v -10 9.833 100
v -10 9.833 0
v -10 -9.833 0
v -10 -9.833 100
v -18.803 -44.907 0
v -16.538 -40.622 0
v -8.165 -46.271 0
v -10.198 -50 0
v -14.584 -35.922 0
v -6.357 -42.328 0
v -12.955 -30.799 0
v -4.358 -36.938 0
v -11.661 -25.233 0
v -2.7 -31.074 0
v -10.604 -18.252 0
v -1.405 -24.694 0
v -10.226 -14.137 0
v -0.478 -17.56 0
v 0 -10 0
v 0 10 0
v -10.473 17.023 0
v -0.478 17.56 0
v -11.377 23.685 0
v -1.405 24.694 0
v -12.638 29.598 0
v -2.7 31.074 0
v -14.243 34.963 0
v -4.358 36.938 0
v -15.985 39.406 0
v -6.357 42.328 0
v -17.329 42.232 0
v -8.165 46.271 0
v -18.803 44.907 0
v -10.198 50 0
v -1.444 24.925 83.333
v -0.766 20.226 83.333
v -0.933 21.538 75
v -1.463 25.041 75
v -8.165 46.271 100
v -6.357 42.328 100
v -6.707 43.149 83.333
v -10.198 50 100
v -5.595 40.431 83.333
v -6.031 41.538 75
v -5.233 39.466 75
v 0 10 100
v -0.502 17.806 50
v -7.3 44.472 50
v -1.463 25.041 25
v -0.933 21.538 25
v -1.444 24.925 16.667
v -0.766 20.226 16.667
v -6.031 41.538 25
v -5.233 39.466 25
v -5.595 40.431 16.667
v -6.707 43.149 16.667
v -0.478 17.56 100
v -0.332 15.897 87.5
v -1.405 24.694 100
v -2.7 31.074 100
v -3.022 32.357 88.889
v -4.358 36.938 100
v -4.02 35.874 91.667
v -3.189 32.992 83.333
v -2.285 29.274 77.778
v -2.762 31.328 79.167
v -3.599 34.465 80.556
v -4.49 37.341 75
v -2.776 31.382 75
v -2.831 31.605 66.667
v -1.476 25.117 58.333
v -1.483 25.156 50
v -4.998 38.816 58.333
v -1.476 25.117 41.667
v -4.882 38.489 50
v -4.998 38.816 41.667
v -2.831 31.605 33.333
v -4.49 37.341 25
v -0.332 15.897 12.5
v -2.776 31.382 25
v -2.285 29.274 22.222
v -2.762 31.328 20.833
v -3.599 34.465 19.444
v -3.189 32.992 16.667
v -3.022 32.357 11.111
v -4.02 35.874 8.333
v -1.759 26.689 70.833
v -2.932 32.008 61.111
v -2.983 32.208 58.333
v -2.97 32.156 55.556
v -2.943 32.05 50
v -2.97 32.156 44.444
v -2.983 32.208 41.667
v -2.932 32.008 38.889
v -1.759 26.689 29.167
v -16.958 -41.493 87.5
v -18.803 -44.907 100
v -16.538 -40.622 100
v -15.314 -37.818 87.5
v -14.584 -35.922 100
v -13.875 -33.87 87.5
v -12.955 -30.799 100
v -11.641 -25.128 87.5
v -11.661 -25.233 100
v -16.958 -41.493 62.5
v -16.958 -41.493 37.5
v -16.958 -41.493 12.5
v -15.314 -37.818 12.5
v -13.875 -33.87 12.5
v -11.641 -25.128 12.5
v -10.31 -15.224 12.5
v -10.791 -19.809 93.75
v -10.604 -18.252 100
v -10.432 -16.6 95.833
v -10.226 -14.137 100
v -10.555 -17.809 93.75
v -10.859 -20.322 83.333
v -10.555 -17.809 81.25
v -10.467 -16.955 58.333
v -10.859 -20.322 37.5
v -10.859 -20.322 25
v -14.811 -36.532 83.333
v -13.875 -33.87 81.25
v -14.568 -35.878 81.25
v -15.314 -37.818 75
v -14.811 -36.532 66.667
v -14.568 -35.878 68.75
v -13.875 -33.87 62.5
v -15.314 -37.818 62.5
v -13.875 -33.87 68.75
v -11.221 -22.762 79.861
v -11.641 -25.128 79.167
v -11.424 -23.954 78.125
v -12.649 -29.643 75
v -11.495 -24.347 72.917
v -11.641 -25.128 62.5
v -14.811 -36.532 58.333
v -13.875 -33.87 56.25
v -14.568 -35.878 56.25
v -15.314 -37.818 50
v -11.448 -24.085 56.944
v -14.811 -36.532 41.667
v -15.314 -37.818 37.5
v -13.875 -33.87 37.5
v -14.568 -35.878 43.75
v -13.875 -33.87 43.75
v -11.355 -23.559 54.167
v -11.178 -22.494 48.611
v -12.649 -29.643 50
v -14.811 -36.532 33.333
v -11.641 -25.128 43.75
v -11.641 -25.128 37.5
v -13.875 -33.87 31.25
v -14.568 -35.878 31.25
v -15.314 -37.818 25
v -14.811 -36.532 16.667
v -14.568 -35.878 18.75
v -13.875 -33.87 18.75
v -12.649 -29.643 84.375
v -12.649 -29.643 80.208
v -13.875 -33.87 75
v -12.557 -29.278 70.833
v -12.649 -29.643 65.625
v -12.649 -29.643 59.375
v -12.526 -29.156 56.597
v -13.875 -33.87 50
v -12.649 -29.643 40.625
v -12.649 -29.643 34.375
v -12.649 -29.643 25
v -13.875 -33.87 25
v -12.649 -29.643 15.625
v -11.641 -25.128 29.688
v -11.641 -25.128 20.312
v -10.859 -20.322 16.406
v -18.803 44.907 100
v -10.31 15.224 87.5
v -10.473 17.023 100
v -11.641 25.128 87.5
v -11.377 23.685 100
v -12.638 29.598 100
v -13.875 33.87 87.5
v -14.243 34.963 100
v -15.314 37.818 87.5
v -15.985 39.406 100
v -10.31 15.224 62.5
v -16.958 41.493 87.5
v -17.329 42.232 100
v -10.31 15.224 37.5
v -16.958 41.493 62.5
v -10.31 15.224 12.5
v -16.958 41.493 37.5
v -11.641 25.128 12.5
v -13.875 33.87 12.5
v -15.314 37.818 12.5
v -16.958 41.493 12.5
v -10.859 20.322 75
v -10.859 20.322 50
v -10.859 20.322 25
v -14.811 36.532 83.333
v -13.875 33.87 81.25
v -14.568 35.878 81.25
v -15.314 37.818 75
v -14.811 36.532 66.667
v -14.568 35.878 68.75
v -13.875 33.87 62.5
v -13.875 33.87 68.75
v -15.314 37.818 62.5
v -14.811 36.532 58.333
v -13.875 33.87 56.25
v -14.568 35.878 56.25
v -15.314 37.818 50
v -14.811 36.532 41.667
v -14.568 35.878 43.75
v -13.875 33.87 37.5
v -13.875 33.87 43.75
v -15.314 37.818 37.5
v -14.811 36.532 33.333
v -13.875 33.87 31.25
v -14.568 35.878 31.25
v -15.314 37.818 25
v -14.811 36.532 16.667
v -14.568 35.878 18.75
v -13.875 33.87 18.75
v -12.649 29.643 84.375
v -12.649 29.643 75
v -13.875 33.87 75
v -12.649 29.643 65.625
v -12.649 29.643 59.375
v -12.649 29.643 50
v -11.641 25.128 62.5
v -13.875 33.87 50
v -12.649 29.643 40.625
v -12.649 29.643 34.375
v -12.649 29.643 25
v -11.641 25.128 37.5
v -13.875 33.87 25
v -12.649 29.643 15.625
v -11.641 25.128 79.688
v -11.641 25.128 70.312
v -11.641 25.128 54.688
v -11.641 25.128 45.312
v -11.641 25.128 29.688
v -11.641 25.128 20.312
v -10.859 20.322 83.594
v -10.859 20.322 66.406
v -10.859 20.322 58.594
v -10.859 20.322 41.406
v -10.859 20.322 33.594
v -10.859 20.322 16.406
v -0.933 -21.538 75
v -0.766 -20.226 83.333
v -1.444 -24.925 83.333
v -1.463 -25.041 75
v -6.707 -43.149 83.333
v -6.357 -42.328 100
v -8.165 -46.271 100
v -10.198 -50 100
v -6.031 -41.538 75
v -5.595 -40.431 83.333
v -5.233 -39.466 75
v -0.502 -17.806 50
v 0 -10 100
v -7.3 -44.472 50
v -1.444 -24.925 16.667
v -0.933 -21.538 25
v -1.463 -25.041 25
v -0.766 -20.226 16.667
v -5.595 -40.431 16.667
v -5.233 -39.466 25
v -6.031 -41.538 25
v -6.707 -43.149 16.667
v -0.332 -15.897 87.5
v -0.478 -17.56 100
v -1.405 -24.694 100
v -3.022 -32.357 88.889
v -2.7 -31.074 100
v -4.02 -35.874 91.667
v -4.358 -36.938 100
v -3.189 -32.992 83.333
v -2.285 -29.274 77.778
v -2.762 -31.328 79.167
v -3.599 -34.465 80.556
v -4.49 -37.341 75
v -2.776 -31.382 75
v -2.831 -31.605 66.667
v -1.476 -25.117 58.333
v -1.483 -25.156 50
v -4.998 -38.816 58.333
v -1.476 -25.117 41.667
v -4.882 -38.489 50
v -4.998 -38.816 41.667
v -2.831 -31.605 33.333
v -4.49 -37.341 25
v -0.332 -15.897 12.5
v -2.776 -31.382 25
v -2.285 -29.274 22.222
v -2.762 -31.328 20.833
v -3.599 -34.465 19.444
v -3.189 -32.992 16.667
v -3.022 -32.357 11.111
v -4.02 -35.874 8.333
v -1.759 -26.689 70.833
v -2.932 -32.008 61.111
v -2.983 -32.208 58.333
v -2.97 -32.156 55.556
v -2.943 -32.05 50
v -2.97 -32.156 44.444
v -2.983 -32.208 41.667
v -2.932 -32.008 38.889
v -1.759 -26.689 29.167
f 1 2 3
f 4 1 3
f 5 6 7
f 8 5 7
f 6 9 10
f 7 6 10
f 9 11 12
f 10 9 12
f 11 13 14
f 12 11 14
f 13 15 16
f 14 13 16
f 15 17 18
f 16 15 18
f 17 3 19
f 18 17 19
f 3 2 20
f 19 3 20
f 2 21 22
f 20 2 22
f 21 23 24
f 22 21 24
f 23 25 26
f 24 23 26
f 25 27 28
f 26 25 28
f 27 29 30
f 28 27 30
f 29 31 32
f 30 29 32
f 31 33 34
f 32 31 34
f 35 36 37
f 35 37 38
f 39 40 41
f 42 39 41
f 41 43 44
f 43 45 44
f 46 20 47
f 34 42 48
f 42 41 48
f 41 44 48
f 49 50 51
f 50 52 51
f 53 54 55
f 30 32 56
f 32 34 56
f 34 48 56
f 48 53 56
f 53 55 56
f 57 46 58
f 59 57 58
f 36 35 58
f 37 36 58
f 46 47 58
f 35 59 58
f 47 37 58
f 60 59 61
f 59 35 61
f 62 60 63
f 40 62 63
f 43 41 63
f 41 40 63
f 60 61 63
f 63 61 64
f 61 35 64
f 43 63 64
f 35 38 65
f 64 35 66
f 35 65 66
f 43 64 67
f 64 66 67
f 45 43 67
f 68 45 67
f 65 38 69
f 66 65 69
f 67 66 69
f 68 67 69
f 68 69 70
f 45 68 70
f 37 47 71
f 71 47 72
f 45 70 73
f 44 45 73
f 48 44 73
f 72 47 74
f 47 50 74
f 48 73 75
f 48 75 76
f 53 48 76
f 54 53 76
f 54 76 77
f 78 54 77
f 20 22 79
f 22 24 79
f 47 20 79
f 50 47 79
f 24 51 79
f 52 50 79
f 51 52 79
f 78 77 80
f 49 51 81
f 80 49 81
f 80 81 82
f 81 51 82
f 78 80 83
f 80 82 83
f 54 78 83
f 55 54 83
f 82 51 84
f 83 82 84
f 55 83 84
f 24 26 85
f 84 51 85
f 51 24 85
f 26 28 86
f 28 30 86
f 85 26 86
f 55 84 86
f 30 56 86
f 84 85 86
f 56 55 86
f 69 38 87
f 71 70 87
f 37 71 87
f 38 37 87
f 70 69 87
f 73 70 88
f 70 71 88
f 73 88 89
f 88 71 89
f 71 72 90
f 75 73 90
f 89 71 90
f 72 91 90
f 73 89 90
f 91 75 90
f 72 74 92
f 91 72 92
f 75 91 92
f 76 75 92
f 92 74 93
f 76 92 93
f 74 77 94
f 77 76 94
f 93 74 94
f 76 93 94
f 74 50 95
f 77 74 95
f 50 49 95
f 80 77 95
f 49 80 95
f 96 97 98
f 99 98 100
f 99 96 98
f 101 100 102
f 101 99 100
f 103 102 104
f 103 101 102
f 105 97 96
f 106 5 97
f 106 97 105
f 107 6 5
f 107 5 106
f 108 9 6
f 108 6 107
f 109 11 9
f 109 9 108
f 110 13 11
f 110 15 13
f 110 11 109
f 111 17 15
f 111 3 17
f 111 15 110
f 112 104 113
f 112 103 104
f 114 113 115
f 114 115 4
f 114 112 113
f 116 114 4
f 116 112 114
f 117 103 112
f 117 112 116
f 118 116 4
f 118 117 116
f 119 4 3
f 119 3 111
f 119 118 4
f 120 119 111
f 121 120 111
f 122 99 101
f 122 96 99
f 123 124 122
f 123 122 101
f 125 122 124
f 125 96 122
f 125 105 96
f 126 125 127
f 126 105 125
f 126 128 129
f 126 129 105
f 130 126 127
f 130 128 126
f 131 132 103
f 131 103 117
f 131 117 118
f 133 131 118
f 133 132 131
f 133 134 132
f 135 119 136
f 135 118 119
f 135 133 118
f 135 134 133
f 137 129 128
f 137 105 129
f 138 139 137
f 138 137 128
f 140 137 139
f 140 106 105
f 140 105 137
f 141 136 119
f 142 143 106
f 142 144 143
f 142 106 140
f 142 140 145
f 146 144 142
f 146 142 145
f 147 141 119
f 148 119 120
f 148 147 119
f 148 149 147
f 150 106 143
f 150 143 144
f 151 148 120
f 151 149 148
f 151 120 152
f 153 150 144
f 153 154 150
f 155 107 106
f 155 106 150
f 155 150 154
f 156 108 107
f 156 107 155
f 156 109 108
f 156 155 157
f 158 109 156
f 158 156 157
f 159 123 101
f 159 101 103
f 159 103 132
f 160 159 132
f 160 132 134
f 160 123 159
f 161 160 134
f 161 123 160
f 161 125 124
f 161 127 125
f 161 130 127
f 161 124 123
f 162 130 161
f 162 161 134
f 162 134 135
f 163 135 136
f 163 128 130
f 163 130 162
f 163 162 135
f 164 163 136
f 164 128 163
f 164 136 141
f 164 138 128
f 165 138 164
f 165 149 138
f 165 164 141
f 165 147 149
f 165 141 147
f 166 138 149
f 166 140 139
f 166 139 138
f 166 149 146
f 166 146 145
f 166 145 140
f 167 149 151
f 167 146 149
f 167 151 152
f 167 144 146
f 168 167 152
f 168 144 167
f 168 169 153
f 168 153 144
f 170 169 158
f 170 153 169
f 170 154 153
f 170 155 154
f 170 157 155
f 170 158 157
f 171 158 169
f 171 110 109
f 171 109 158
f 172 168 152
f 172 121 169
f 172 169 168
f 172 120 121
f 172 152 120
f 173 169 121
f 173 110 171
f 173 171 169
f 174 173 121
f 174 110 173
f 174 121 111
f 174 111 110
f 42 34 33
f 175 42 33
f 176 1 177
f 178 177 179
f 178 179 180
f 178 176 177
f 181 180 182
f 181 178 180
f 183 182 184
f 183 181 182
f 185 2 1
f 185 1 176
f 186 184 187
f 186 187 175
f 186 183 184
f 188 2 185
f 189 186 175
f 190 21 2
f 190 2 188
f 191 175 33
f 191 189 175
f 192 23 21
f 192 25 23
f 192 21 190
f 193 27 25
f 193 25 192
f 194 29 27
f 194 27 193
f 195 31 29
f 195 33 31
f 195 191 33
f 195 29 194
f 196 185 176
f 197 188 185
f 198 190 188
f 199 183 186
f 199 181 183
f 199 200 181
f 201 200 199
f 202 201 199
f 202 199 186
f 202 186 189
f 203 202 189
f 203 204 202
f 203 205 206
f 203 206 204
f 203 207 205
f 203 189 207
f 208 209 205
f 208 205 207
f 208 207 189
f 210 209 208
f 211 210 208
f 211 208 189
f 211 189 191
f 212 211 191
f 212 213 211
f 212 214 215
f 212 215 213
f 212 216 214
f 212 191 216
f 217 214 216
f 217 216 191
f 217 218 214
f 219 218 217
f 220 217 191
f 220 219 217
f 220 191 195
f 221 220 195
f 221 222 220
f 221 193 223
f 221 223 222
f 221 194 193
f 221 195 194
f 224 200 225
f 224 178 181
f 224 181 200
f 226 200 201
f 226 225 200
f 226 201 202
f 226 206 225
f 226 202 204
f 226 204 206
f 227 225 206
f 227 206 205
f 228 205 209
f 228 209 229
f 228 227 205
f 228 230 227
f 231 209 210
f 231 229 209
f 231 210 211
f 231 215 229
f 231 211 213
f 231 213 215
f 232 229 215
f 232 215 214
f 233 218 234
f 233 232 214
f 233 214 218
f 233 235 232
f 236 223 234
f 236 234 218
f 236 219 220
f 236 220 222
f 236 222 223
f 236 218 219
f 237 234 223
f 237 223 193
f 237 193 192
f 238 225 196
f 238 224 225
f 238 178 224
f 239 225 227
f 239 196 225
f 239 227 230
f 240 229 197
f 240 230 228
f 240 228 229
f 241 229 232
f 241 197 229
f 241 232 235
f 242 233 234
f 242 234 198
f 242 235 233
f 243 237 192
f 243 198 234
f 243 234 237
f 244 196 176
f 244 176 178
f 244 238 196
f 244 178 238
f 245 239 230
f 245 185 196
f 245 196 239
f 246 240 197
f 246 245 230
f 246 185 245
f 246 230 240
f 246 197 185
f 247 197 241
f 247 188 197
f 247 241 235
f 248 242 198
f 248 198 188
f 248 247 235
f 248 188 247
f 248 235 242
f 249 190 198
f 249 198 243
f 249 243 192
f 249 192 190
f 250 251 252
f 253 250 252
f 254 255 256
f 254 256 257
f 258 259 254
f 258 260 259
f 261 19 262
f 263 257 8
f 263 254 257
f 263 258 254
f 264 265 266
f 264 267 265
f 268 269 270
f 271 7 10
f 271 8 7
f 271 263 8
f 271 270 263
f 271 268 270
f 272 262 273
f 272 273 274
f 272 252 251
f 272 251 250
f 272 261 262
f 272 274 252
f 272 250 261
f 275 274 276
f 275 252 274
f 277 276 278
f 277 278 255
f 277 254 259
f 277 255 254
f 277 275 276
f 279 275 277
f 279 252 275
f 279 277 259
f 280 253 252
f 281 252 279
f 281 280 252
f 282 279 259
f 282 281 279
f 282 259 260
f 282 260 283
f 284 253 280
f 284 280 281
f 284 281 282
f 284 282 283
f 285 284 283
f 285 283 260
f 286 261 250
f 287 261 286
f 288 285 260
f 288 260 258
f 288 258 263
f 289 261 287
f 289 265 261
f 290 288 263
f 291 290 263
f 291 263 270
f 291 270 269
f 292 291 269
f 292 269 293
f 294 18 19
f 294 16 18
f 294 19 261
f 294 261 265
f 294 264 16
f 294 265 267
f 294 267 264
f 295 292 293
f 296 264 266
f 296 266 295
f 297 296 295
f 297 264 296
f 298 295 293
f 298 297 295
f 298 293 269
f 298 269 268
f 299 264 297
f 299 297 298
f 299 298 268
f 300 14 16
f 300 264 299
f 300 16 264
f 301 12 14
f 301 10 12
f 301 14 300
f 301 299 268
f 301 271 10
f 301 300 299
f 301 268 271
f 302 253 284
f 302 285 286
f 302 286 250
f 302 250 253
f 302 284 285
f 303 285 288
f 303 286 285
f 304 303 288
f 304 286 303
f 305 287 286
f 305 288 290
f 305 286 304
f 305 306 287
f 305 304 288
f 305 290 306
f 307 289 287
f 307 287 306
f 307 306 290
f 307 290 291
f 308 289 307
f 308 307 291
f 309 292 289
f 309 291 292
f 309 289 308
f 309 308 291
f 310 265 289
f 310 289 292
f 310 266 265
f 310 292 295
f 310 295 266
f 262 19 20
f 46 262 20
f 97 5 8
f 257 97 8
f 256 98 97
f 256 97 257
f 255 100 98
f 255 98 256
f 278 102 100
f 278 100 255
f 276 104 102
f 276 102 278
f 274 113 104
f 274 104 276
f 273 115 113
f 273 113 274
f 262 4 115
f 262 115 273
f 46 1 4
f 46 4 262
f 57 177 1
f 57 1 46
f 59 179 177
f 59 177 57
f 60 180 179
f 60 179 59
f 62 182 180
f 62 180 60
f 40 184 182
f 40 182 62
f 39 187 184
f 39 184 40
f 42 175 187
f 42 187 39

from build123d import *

# Parameters (mm, degrees)
BOSS_EXTRUDE1_DEPTH = 100


with BuildPart() as part:
    # Sketch1 → Boss-Extrude1 (new body)
    with BuildSketch(Plane.XY):
        with BuildLine():
            Line((0, 0), (0, 10))
            add(Edge.make_bspline(
                [(0, 10), (-0.787242099, 34.100733869), (-10.197534483, 50)],
                knots=[0, 0, 0, 1, 1, 1], degree=2))
            Line((-10.197534483, 50), (-18.803177319, 44.906581563))
            add(Edge.make_bspline(
                [(-10, 9.833471065), (-10.030967353, 10.744471696), (-10.114706096, 12.582680835), (-10.361531, 16.119334261), (-10.820269758, 20.371956037), (-11.603430489, 25.176045178), (-12.949670493, 31.196907646), (-14.728828853, 36.634857764), (-16.928703227, 41.544185237), (-18.144309171, 43.793383416), (-18.803177319, 44.906581563)],
                knots=[0.003595485, 0.003595485, 0.003595485, 0.003595485, 0.065870767, 0.12814605, 0.252696614, 0.377247178, 0.501797743, 0.750898871, 0.875449436, 1, 1, 1, 1], degree=3))
            Line((-10, 9.833471065), (-10, 0))
            Line((-10, 0), (-10, -9.833471065))
            add(Edge.make_bspline(
                [(-18.803177319, -44.906581563), (-18.144309171, -43.793383416), (-16.928703227, -41.544185237), (-14.728828853, -36.634857764), (-12.949670493, -31.196907646), (-11.603430489, -25.176045178), (-10.820269758, -20.371956037), (-10.361531, -16.119334261), (-10.114706096, -12.582680835), (-10.030967353, -10.744471696), (-10, -9.833471065)],
                knots=[0.003595485, 0.003595485, 0.003595485, 0.003595485, 0.12814605, 0.252696614, 0.501797743, 0.626348307, 0.750898871, 0.875449436, 0.937724718, 1, 1, 1, 1], degree=3))
            Line((-18.803177319, -44.906581563), (-10.197534483, -50))
            add(Edge.make_bspline(
                [(0, -10), (-0.787242099, -34.100733869), (-10.197534483, -50)],
                knots=[0, 0, 0, 1, 1, 1], degree=2))
            Line((0, -10), (0, 0))
        make_face()
    extrude(amount=BOSS_EXTRUDE1_DEPTH)


solid = part.part
